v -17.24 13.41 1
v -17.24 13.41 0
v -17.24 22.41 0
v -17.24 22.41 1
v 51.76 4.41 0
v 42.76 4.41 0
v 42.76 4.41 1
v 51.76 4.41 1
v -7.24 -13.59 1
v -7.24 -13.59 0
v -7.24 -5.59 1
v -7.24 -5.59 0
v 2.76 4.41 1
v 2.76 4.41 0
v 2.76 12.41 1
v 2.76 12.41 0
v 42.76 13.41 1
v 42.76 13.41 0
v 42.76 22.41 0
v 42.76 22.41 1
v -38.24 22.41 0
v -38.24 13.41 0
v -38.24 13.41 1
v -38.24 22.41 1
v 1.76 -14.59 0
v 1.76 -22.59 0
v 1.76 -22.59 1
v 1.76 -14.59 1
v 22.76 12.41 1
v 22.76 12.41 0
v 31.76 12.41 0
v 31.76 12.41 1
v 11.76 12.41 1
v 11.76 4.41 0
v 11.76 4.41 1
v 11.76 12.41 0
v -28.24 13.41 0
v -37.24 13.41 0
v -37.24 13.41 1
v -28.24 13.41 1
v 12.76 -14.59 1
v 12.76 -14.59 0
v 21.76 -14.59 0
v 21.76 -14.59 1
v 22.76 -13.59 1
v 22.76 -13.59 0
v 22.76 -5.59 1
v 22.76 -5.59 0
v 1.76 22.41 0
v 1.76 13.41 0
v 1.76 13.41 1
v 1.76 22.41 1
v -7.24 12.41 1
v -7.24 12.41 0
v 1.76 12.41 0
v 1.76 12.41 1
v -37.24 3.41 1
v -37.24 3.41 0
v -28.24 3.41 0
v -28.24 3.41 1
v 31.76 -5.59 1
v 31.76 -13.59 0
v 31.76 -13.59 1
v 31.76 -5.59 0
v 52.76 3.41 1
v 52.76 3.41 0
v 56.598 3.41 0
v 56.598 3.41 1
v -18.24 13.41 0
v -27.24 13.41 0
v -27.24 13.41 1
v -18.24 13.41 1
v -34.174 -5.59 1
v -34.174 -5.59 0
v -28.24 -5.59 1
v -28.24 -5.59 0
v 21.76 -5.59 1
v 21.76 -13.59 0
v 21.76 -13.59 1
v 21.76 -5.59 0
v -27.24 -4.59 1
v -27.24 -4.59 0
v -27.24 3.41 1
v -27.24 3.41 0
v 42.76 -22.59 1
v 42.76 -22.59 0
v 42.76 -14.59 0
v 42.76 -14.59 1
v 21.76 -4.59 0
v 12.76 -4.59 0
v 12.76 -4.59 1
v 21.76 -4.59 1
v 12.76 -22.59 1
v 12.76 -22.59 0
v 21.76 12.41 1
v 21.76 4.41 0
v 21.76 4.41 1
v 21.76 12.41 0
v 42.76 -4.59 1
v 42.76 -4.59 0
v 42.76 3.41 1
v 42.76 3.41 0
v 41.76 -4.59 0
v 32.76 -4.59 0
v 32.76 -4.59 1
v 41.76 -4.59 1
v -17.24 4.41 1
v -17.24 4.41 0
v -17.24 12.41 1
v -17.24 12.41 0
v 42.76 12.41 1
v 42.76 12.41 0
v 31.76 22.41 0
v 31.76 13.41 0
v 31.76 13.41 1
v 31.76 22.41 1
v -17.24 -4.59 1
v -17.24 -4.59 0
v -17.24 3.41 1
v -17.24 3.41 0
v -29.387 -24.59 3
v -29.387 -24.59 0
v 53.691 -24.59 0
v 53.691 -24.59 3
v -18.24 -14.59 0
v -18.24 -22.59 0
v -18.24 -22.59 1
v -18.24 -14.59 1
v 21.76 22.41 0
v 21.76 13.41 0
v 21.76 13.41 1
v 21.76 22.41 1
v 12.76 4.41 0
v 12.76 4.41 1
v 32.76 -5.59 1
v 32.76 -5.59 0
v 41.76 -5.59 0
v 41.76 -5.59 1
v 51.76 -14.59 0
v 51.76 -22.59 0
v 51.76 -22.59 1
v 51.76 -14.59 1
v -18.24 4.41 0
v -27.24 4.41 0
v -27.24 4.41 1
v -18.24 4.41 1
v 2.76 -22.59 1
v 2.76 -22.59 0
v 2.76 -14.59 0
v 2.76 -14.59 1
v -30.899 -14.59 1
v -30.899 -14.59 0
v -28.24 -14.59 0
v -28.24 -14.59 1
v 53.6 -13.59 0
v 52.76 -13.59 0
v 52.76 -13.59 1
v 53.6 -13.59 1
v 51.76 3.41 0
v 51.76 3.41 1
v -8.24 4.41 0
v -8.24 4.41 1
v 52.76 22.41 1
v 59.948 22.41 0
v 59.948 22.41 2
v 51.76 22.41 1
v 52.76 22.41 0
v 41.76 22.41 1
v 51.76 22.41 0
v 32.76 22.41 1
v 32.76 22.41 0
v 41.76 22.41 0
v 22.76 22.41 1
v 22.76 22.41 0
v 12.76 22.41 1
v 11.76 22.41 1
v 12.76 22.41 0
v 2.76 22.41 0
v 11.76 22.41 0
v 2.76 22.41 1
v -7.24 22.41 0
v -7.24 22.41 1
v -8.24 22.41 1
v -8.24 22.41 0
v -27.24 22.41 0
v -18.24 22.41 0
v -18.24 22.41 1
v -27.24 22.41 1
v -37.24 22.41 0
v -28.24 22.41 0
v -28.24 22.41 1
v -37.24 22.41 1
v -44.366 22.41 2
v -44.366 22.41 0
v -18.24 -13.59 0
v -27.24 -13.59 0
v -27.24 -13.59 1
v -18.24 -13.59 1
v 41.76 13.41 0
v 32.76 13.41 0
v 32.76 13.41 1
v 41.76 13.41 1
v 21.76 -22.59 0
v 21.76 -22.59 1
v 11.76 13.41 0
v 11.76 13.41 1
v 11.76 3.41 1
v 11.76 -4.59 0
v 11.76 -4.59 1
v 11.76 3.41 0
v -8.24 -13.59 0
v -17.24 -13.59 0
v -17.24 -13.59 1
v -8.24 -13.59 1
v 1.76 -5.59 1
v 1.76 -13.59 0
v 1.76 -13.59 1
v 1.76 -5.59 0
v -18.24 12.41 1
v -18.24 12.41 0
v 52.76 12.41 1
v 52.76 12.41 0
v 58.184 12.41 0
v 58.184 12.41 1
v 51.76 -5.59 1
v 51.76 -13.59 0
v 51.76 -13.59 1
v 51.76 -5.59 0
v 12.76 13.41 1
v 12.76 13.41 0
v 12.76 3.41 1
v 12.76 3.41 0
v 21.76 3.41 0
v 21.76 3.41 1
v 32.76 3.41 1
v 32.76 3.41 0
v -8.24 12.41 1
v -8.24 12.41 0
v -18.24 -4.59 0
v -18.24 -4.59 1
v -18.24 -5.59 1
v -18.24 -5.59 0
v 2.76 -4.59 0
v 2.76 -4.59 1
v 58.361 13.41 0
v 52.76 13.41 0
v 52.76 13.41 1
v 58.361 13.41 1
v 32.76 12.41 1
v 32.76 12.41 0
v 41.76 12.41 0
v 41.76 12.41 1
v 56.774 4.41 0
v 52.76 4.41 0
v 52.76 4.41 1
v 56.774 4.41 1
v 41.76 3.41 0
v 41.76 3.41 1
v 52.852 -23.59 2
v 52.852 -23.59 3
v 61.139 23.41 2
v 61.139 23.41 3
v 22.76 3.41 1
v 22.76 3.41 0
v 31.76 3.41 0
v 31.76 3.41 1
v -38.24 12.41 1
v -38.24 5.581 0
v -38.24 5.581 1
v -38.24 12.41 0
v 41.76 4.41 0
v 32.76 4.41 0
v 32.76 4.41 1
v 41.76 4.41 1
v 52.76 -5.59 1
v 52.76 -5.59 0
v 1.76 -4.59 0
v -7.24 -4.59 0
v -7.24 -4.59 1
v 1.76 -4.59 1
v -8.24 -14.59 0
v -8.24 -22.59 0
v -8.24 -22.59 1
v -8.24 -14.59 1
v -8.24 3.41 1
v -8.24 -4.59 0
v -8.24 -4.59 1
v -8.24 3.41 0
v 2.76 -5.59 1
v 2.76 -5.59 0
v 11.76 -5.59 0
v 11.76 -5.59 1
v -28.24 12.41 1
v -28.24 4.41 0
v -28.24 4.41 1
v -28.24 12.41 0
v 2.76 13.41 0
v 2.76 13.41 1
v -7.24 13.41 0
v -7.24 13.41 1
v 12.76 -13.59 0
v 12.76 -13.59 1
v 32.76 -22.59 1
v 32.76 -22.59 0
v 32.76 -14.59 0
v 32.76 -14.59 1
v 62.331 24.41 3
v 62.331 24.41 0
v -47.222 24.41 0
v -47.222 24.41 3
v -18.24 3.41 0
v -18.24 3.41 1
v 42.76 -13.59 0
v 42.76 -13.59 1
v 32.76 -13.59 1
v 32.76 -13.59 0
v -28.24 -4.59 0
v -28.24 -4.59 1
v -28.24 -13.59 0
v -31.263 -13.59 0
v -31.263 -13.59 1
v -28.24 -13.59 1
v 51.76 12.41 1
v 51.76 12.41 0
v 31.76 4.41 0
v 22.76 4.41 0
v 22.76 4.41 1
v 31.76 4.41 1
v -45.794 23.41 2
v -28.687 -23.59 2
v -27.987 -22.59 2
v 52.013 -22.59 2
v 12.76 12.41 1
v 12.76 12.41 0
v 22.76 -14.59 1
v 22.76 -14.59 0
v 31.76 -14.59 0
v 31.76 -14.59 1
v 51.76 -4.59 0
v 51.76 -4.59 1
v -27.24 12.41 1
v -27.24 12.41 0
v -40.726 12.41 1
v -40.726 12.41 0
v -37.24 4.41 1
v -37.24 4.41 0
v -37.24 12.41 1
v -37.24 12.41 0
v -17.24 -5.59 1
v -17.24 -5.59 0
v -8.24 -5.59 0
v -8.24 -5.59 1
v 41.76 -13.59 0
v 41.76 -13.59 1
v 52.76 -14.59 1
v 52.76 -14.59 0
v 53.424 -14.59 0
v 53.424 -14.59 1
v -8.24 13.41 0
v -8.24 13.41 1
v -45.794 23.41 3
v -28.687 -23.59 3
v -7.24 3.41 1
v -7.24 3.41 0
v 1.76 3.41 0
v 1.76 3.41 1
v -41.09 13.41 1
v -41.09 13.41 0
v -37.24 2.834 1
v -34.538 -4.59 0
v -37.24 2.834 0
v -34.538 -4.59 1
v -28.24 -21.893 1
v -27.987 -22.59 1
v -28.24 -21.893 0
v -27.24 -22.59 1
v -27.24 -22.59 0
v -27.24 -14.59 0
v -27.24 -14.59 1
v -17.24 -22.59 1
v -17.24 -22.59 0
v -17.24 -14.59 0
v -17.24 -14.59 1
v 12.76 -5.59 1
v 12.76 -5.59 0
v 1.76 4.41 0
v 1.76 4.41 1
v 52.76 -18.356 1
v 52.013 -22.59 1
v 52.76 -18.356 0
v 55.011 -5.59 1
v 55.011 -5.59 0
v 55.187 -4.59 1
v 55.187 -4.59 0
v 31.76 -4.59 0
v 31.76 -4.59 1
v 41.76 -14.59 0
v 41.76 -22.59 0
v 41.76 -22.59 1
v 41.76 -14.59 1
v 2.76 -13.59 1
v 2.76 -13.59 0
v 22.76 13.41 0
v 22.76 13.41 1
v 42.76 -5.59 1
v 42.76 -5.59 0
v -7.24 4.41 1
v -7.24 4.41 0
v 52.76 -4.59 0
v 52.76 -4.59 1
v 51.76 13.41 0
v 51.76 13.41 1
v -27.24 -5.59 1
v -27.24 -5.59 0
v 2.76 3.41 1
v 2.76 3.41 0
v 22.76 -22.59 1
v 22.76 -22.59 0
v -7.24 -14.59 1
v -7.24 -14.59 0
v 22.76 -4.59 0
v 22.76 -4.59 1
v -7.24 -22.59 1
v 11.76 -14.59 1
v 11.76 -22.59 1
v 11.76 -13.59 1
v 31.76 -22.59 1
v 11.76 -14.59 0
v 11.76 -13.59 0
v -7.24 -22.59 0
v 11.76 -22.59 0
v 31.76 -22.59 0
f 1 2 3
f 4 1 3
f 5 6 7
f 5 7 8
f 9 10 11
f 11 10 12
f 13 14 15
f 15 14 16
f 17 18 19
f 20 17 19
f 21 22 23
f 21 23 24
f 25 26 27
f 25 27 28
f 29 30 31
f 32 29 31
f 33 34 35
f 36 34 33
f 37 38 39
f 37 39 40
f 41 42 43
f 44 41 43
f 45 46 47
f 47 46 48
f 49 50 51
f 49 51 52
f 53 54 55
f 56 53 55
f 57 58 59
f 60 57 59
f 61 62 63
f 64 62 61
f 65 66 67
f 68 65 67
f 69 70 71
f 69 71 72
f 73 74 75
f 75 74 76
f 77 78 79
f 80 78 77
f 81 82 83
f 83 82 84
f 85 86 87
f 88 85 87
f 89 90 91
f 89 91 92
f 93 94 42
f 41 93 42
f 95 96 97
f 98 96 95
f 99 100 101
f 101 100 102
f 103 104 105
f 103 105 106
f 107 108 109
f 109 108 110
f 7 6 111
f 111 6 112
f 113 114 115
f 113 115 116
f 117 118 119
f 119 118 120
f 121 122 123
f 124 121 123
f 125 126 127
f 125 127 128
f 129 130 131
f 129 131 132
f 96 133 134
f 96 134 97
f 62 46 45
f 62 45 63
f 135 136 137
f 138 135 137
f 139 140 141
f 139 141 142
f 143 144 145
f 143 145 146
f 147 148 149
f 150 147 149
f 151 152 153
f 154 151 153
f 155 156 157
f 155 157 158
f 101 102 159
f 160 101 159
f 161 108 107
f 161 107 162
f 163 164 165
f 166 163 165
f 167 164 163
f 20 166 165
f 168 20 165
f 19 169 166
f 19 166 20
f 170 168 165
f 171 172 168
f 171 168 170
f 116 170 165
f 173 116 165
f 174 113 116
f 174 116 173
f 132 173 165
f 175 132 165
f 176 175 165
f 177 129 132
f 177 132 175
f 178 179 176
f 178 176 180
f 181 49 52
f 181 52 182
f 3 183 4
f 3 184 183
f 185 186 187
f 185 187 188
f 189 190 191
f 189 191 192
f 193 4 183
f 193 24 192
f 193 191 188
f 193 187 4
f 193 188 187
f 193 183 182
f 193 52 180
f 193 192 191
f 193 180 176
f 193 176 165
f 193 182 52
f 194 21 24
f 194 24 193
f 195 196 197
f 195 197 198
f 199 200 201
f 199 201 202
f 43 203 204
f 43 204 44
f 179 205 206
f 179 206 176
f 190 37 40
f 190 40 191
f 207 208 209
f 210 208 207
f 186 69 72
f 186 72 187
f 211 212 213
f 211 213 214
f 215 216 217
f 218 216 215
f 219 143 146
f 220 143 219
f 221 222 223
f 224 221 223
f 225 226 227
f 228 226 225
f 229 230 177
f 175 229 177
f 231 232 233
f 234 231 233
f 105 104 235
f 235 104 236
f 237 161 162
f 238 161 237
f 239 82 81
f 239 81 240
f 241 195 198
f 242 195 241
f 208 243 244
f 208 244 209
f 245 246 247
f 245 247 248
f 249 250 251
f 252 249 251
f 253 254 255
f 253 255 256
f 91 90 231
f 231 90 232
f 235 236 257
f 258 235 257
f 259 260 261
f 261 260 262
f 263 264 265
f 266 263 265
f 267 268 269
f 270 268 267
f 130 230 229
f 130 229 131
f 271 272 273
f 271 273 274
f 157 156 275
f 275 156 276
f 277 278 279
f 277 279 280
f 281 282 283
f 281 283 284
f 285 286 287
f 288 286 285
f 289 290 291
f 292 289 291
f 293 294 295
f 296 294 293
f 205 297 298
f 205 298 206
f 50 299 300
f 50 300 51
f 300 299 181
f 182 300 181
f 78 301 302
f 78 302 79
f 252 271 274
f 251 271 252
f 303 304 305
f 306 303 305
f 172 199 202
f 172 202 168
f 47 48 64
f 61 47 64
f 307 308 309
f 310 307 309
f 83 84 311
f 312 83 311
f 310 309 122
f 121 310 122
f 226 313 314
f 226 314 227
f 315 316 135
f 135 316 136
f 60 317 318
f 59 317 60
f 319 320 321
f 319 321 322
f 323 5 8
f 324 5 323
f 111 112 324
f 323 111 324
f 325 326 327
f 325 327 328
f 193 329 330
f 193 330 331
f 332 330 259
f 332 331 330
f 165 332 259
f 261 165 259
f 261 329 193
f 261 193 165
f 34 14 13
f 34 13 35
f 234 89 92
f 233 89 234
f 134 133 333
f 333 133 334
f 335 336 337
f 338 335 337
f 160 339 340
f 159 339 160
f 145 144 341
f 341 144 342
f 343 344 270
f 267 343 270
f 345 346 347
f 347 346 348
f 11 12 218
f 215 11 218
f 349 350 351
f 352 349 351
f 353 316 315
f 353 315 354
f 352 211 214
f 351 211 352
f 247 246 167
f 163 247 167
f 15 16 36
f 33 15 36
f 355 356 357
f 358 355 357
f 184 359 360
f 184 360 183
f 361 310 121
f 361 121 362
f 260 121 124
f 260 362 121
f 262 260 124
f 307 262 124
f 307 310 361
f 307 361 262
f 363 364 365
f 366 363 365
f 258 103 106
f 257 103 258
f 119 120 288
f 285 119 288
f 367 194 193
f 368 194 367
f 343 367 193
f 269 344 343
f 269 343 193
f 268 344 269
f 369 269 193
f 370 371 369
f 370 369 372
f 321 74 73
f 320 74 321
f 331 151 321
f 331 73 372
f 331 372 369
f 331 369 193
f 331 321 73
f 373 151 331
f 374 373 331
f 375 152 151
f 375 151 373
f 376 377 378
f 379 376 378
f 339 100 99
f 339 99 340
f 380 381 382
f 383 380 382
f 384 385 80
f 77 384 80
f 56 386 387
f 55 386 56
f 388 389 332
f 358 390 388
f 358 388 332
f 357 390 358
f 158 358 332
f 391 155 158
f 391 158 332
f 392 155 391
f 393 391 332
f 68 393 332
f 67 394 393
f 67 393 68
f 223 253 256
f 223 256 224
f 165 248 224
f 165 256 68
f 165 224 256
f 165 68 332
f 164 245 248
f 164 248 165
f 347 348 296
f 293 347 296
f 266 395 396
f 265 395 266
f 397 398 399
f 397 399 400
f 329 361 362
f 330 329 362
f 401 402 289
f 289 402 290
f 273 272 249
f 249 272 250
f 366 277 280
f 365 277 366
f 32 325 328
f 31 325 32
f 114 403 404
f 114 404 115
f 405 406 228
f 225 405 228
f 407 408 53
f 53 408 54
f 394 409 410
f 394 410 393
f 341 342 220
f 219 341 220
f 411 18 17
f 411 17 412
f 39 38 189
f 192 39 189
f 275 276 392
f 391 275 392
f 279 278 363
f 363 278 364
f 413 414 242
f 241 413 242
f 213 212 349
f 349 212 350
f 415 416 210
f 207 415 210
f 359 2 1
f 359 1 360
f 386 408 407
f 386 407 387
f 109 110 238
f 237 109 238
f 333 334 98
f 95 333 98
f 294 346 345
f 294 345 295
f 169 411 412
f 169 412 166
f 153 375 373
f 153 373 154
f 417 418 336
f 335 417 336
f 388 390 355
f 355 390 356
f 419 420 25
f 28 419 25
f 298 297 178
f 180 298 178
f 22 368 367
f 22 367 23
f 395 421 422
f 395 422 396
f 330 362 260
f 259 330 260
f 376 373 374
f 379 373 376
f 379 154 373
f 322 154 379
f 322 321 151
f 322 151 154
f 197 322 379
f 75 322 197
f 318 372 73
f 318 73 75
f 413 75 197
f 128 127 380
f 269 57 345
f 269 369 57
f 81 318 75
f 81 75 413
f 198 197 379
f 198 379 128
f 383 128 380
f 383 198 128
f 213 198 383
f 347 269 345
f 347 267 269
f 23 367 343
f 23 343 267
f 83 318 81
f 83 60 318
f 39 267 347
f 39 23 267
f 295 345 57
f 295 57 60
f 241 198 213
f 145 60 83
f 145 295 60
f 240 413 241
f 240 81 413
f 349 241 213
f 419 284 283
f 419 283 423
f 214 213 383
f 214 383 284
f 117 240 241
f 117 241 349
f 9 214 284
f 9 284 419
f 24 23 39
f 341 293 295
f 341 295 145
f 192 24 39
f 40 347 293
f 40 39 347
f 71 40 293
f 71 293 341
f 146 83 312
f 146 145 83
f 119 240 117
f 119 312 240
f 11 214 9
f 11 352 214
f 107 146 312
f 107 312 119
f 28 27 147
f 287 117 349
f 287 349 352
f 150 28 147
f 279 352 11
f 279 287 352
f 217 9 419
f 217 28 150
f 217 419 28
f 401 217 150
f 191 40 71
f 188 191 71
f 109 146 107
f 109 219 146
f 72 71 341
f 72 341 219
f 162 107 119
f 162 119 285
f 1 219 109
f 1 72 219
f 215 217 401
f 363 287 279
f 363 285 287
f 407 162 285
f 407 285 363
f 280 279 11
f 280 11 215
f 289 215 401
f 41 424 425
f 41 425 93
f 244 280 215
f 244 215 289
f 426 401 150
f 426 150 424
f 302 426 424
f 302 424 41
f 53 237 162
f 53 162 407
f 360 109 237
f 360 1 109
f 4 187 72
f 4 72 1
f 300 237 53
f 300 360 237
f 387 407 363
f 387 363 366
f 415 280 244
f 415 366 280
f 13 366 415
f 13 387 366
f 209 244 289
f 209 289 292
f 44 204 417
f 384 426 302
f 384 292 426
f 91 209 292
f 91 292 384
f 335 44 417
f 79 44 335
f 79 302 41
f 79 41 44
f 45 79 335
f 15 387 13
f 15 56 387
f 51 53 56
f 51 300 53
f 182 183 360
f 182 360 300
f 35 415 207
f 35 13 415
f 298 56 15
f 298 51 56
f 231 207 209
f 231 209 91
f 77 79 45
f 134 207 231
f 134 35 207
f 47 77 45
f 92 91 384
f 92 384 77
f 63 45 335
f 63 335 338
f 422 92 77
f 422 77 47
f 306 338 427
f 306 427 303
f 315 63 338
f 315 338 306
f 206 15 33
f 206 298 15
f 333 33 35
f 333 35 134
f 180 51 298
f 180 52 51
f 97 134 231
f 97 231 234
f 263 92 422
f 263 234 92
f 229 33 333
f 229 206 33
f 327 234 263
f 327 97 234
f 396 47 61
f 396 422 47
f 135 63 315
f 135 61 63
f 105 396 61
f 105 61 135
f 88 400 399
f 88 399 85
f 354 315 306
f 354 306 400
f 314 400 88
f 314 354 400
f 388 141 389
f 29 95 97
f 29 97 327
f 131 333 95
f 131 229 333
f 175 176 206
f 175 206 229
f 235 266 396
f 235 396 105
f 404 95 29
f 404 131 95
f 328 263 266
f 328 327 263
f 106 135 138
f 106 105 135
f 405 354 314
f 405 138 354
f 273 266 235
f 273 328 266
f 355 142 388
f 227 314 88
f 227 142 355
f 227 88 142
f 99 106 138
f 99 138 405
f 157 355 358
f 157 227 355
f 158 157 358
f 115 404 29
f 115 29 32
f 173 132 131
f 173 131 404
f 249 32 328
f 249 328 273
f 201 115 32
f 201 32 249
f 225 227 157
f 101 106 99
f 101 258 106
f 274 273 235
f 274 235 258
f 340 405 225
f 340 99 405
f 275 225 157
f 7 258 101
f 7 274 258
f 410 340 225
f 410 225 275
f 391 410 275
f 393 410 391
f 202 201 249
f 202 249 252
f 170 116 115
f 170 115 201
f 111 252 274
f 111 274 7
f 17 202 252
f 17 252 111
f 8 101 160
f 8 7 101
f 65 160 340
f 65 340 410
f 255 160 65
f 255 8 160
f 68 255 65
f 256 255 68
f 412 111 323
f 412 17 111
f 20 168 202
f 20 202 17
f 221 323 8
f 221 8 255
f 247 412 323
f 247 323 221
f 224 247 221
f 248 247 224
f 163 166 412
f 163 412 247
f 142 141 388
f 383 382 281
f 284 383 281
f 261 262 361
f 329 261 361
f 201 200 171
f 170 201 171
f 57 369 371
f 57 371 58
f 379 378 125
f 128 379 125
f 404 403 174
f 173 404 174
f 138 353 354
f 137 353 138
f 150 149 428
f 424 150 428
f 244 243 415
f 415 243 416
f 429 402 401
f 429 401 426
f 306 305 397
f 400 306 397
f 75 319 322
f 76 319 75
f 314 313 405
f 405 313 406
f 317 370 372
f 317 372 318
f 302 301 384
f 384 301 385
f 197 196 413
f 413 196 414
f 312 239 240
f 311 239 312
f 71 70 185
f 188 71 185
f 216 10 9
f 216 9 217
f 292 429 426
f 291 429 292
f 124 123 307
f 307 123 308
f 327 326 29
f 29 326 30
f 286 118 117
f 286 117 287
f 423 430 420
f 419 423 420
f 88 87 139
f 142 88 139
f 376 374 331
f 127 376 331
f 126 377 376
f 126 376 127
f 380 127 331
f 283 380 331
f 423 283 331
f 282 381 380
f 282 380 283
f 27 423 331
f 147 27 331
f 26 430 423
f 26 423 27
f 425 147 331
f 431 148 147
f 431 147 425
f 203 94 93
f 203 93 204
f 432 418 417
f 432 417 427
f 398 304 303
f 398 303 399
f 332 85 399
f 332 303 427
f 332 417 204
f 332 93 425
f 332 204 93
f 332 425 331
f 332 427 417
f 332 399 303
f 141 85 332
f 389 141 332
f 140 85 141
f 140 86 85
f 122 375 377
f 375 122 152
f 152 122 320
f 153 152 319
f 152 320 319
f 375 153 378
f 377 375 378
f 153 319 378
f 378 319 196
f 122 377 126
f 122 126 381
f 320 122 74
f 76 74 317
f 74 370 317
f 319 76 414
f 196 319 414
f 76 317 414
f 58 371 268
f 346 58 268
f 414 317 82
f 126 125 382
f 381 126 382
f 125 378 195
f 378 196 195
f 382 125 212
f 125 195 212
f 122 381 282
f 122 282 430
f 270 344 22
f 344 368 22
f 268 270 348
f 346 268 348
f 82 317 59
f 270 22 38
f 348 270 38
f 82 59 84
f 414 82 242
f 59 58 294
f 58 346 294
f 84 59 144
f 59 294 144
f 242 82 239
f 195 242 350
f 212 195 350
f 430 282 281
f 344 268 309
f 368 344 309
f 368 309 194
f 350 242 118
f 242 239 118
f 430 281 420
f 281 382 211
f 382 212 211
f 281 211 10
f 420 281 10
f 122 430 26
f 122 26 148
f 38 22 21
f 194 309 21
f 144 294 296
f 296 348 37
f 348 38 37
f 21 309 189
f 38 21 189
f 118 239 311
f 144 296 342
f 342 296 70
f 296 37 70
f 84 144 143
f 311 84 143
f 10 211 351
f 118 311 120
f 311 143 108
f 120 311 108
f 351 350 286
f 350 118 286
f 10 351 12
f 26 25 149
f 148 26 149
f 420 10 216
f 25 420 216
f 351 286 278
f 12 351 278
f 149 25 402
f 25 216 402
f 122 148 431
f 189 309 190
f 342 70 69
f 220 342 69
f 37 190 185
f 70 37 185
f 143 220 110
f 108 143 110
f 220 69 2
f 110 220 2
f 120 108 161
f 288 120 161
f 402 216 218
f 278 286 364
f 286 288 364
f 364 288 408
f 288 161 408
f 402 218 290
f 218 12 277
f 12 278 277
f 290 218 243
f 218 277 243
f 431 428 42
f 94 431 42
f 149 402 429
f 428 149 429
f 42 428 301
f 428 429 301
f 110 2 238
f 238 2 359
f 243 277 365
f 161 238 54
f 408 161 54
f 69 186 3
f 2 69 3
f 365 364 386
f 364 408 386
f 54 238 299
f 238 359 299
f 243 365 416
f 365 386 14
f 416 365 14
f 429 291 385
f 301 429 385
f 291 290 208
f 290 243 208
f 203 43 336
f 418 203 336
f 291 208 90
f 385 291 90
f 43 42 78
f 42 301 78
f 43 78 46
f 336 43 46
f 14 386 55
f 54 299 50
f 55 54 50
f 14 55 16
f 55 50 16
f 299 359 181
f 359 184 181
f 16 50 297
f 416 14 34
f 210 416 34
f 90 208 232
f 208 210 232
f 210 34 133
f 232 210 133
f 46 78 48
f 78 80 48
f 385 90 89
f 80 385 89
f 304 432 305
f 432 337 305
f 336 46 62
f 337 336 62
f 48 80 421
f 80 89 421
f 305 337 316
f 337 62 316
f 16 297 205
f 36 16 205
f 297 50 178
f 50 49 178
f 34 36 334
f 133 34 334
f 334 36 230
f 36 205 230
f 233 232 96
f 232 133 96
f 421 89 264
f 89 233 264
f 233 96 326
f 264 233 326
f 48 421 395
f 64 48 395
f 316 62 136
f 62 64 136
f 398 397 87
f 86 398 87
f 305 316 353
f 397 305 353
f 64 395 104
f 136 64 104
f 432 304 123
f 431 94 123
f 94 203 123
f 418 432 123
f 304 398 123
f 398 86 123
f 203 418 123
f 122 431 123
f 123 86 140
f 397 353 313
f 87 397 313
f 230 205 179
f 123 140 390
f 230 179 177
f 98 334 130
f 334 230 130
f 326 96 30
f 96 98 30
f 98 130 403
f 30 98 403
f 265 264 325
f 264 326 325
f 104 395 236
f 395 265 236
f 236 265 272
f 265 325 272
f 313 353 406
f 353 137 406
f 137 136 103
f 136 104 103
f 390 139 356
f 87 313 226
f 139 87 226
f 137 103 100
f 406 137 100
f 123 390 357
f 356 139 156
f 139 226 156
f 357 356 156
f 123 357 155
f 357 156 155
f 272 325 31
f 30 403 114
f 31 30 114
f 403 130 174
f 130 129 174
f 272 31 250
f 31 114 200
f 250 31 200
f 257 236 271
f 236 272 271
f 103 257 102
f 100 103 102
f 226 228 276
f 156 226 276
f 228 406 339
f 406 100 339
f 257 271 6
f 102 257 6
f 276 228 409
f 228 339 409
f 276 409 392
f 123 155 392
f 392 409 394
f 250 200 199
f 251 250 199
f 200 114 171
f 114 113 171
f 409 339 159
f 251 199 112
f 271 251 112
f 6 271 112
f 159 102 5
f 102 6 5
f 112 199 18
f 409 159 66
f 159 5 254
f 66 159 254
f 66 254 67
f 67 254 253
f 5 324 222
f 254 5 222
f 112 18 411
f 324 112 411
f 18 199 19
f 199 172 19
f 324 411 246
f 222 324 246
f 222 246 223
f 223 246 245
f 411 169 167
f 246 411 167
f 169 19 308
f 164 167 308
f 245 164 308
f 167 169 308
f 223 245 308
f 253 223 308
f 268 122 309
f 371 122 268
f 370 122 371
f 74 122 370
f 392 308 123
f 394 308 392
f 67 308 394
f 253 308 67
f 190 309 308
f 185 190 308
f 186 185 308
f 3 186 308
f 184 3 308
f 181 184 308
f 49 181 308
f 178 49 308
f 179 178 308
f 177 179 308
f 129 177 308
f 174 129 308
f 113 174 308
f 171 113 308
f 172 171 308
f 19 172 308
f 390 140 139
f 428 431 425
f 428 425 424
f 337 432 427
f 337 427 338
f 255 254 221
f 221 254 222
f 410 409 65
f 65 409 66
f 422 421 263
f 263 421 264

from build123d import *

# Parameters (mm, degrees)
BOSS_EXTRU_1_DEPTH         = 3
ENL_V_MAT_EXTRU_1_DEPTH    = 1
ESQUISSE3_W                = 1
ESQUISSE3_H                = 46.165382348
BOSS_EXTRU_2_DEPTH         = 1
R_P_TITION_LIN_AIRE1_COUNT = 10
R_P_TITION_LIN_AIRE1_PITCH = 10
ESQUISSE4_W                = 115.142225127
ESQUISSE4_H                = 1
BOSS_EXTRU_3_DEPTH         = 1
R_P_TITION_LIN_AIRE2_COUNT = 4
R_P_TITION_LIN_AIRE2_PITCH = 9
ESQUISSE6_W                = 145.186811134
ESQUISSE6_H                = 82.250288406
ENL_V_MAT_EXTRU_2_DEPTH    = 4


with BuildPart() as part:
    # Esquisse1 → Boss.-Extru.1 (new body)
    with BuildSketch(Plane.XY):
        Polygon((-47.221929914, 24.410148906), (-29.387388435, -24.589851094), (53.691225904, -24.589851094), (62.331247959, 24.410148906), align=None)
        Polygon((-27.986973358, -22.589851094), (52.013026642, -22.589851094), (59.947740773, 22.410148906), (-44.3656339, 22.410148906), align=None, mode=Mode.SUBTRACT)
    extrude(amount=BOSS_EXTRU_1_DEPTH)

    # Esquisse2 → Enlèv. mat.-Extru.1 (cut)
    with BuildSketch(Plane.XY.offset(3)):
        Polygon((61.139494366, 23.410148906), (-45.793781907, 23.410148906), (-28.687180897, -23.589851094), (52.852126273, -23.589851094), align=None)
        Polygon((59.947740773, 22.410148906), (-44.3656339, 22.410148906), (-27.986973358, -22.589851094), (52.013026642, -22.589851094), align=None, mode=Mode.SUBTRACT)
    extrude(amount=-ENL_V_MAT_EXTRU_1_DEPTH, mode=Mode.SUBTRACT)

    # Esquisse3 → Boss.-Extru.2 (add)
    with BuildSketch(Plane.XY):
        with Locations((-37.740481402, -0.672542268)):
            Rectangle(ESQUISSE3_W, ESQUISSE3_H)
    boss_extru_2 = extrude(amount=BOSS_EXTRU_2_DEPTH)

    # Répétition linéaire1: Boss.-Extru.2 ×10
    with Locations(*[(i * R_P_TITION_LIN_AIRE1_PITCH, 0, 0) for i in range(1, R_P_TITION_LIN_AIRE1_COUNT)]):
        add(boss_extru_2)

    # Esquisse4 → Boss.-Extru.3 (add)
    with BuildSketch(Plane.XY):
        with Locations((11.695067266, 12.910148906)):
            Rectangle(ESQUISSE4_W, ESQUISSE4_H)
    boss_extru_3 = extrude(amount=BOSS_EXTRU_3_DEPTH)

    # Répétition linéaire2: Boss.-Extru.3 ×4
    with Locations(*[(0, -i * R_P_TITION_LIN_AIRE2_PITCH, 0) for i in range(1, R_P_TITION_LIN_AIRE2_COUNT)]):
        add(boss_extru_3)

    # Esquisse6 → Enlèv. mat.-Extru.2 (cut, through all)
    with BuildSketch(Plane.XY.offset(3)):
        with Locations((8.362981272, 0)):
            Rectangle(ESQUISSE6_W, ESQUISSE6_H)
        Polygon((62.331247959, 24.410148906), (-47.221929914, 24.410148906), (-29.387388435, -24.589851094), (53.691225904, -24.589851094), align=None, mode=Mode.SUBTRACT)
    extrude(amount=-ENL_V_MAT_EXTRU_2_DEPTH, mode=Mode.SUBTRACT)


solid = part.part
